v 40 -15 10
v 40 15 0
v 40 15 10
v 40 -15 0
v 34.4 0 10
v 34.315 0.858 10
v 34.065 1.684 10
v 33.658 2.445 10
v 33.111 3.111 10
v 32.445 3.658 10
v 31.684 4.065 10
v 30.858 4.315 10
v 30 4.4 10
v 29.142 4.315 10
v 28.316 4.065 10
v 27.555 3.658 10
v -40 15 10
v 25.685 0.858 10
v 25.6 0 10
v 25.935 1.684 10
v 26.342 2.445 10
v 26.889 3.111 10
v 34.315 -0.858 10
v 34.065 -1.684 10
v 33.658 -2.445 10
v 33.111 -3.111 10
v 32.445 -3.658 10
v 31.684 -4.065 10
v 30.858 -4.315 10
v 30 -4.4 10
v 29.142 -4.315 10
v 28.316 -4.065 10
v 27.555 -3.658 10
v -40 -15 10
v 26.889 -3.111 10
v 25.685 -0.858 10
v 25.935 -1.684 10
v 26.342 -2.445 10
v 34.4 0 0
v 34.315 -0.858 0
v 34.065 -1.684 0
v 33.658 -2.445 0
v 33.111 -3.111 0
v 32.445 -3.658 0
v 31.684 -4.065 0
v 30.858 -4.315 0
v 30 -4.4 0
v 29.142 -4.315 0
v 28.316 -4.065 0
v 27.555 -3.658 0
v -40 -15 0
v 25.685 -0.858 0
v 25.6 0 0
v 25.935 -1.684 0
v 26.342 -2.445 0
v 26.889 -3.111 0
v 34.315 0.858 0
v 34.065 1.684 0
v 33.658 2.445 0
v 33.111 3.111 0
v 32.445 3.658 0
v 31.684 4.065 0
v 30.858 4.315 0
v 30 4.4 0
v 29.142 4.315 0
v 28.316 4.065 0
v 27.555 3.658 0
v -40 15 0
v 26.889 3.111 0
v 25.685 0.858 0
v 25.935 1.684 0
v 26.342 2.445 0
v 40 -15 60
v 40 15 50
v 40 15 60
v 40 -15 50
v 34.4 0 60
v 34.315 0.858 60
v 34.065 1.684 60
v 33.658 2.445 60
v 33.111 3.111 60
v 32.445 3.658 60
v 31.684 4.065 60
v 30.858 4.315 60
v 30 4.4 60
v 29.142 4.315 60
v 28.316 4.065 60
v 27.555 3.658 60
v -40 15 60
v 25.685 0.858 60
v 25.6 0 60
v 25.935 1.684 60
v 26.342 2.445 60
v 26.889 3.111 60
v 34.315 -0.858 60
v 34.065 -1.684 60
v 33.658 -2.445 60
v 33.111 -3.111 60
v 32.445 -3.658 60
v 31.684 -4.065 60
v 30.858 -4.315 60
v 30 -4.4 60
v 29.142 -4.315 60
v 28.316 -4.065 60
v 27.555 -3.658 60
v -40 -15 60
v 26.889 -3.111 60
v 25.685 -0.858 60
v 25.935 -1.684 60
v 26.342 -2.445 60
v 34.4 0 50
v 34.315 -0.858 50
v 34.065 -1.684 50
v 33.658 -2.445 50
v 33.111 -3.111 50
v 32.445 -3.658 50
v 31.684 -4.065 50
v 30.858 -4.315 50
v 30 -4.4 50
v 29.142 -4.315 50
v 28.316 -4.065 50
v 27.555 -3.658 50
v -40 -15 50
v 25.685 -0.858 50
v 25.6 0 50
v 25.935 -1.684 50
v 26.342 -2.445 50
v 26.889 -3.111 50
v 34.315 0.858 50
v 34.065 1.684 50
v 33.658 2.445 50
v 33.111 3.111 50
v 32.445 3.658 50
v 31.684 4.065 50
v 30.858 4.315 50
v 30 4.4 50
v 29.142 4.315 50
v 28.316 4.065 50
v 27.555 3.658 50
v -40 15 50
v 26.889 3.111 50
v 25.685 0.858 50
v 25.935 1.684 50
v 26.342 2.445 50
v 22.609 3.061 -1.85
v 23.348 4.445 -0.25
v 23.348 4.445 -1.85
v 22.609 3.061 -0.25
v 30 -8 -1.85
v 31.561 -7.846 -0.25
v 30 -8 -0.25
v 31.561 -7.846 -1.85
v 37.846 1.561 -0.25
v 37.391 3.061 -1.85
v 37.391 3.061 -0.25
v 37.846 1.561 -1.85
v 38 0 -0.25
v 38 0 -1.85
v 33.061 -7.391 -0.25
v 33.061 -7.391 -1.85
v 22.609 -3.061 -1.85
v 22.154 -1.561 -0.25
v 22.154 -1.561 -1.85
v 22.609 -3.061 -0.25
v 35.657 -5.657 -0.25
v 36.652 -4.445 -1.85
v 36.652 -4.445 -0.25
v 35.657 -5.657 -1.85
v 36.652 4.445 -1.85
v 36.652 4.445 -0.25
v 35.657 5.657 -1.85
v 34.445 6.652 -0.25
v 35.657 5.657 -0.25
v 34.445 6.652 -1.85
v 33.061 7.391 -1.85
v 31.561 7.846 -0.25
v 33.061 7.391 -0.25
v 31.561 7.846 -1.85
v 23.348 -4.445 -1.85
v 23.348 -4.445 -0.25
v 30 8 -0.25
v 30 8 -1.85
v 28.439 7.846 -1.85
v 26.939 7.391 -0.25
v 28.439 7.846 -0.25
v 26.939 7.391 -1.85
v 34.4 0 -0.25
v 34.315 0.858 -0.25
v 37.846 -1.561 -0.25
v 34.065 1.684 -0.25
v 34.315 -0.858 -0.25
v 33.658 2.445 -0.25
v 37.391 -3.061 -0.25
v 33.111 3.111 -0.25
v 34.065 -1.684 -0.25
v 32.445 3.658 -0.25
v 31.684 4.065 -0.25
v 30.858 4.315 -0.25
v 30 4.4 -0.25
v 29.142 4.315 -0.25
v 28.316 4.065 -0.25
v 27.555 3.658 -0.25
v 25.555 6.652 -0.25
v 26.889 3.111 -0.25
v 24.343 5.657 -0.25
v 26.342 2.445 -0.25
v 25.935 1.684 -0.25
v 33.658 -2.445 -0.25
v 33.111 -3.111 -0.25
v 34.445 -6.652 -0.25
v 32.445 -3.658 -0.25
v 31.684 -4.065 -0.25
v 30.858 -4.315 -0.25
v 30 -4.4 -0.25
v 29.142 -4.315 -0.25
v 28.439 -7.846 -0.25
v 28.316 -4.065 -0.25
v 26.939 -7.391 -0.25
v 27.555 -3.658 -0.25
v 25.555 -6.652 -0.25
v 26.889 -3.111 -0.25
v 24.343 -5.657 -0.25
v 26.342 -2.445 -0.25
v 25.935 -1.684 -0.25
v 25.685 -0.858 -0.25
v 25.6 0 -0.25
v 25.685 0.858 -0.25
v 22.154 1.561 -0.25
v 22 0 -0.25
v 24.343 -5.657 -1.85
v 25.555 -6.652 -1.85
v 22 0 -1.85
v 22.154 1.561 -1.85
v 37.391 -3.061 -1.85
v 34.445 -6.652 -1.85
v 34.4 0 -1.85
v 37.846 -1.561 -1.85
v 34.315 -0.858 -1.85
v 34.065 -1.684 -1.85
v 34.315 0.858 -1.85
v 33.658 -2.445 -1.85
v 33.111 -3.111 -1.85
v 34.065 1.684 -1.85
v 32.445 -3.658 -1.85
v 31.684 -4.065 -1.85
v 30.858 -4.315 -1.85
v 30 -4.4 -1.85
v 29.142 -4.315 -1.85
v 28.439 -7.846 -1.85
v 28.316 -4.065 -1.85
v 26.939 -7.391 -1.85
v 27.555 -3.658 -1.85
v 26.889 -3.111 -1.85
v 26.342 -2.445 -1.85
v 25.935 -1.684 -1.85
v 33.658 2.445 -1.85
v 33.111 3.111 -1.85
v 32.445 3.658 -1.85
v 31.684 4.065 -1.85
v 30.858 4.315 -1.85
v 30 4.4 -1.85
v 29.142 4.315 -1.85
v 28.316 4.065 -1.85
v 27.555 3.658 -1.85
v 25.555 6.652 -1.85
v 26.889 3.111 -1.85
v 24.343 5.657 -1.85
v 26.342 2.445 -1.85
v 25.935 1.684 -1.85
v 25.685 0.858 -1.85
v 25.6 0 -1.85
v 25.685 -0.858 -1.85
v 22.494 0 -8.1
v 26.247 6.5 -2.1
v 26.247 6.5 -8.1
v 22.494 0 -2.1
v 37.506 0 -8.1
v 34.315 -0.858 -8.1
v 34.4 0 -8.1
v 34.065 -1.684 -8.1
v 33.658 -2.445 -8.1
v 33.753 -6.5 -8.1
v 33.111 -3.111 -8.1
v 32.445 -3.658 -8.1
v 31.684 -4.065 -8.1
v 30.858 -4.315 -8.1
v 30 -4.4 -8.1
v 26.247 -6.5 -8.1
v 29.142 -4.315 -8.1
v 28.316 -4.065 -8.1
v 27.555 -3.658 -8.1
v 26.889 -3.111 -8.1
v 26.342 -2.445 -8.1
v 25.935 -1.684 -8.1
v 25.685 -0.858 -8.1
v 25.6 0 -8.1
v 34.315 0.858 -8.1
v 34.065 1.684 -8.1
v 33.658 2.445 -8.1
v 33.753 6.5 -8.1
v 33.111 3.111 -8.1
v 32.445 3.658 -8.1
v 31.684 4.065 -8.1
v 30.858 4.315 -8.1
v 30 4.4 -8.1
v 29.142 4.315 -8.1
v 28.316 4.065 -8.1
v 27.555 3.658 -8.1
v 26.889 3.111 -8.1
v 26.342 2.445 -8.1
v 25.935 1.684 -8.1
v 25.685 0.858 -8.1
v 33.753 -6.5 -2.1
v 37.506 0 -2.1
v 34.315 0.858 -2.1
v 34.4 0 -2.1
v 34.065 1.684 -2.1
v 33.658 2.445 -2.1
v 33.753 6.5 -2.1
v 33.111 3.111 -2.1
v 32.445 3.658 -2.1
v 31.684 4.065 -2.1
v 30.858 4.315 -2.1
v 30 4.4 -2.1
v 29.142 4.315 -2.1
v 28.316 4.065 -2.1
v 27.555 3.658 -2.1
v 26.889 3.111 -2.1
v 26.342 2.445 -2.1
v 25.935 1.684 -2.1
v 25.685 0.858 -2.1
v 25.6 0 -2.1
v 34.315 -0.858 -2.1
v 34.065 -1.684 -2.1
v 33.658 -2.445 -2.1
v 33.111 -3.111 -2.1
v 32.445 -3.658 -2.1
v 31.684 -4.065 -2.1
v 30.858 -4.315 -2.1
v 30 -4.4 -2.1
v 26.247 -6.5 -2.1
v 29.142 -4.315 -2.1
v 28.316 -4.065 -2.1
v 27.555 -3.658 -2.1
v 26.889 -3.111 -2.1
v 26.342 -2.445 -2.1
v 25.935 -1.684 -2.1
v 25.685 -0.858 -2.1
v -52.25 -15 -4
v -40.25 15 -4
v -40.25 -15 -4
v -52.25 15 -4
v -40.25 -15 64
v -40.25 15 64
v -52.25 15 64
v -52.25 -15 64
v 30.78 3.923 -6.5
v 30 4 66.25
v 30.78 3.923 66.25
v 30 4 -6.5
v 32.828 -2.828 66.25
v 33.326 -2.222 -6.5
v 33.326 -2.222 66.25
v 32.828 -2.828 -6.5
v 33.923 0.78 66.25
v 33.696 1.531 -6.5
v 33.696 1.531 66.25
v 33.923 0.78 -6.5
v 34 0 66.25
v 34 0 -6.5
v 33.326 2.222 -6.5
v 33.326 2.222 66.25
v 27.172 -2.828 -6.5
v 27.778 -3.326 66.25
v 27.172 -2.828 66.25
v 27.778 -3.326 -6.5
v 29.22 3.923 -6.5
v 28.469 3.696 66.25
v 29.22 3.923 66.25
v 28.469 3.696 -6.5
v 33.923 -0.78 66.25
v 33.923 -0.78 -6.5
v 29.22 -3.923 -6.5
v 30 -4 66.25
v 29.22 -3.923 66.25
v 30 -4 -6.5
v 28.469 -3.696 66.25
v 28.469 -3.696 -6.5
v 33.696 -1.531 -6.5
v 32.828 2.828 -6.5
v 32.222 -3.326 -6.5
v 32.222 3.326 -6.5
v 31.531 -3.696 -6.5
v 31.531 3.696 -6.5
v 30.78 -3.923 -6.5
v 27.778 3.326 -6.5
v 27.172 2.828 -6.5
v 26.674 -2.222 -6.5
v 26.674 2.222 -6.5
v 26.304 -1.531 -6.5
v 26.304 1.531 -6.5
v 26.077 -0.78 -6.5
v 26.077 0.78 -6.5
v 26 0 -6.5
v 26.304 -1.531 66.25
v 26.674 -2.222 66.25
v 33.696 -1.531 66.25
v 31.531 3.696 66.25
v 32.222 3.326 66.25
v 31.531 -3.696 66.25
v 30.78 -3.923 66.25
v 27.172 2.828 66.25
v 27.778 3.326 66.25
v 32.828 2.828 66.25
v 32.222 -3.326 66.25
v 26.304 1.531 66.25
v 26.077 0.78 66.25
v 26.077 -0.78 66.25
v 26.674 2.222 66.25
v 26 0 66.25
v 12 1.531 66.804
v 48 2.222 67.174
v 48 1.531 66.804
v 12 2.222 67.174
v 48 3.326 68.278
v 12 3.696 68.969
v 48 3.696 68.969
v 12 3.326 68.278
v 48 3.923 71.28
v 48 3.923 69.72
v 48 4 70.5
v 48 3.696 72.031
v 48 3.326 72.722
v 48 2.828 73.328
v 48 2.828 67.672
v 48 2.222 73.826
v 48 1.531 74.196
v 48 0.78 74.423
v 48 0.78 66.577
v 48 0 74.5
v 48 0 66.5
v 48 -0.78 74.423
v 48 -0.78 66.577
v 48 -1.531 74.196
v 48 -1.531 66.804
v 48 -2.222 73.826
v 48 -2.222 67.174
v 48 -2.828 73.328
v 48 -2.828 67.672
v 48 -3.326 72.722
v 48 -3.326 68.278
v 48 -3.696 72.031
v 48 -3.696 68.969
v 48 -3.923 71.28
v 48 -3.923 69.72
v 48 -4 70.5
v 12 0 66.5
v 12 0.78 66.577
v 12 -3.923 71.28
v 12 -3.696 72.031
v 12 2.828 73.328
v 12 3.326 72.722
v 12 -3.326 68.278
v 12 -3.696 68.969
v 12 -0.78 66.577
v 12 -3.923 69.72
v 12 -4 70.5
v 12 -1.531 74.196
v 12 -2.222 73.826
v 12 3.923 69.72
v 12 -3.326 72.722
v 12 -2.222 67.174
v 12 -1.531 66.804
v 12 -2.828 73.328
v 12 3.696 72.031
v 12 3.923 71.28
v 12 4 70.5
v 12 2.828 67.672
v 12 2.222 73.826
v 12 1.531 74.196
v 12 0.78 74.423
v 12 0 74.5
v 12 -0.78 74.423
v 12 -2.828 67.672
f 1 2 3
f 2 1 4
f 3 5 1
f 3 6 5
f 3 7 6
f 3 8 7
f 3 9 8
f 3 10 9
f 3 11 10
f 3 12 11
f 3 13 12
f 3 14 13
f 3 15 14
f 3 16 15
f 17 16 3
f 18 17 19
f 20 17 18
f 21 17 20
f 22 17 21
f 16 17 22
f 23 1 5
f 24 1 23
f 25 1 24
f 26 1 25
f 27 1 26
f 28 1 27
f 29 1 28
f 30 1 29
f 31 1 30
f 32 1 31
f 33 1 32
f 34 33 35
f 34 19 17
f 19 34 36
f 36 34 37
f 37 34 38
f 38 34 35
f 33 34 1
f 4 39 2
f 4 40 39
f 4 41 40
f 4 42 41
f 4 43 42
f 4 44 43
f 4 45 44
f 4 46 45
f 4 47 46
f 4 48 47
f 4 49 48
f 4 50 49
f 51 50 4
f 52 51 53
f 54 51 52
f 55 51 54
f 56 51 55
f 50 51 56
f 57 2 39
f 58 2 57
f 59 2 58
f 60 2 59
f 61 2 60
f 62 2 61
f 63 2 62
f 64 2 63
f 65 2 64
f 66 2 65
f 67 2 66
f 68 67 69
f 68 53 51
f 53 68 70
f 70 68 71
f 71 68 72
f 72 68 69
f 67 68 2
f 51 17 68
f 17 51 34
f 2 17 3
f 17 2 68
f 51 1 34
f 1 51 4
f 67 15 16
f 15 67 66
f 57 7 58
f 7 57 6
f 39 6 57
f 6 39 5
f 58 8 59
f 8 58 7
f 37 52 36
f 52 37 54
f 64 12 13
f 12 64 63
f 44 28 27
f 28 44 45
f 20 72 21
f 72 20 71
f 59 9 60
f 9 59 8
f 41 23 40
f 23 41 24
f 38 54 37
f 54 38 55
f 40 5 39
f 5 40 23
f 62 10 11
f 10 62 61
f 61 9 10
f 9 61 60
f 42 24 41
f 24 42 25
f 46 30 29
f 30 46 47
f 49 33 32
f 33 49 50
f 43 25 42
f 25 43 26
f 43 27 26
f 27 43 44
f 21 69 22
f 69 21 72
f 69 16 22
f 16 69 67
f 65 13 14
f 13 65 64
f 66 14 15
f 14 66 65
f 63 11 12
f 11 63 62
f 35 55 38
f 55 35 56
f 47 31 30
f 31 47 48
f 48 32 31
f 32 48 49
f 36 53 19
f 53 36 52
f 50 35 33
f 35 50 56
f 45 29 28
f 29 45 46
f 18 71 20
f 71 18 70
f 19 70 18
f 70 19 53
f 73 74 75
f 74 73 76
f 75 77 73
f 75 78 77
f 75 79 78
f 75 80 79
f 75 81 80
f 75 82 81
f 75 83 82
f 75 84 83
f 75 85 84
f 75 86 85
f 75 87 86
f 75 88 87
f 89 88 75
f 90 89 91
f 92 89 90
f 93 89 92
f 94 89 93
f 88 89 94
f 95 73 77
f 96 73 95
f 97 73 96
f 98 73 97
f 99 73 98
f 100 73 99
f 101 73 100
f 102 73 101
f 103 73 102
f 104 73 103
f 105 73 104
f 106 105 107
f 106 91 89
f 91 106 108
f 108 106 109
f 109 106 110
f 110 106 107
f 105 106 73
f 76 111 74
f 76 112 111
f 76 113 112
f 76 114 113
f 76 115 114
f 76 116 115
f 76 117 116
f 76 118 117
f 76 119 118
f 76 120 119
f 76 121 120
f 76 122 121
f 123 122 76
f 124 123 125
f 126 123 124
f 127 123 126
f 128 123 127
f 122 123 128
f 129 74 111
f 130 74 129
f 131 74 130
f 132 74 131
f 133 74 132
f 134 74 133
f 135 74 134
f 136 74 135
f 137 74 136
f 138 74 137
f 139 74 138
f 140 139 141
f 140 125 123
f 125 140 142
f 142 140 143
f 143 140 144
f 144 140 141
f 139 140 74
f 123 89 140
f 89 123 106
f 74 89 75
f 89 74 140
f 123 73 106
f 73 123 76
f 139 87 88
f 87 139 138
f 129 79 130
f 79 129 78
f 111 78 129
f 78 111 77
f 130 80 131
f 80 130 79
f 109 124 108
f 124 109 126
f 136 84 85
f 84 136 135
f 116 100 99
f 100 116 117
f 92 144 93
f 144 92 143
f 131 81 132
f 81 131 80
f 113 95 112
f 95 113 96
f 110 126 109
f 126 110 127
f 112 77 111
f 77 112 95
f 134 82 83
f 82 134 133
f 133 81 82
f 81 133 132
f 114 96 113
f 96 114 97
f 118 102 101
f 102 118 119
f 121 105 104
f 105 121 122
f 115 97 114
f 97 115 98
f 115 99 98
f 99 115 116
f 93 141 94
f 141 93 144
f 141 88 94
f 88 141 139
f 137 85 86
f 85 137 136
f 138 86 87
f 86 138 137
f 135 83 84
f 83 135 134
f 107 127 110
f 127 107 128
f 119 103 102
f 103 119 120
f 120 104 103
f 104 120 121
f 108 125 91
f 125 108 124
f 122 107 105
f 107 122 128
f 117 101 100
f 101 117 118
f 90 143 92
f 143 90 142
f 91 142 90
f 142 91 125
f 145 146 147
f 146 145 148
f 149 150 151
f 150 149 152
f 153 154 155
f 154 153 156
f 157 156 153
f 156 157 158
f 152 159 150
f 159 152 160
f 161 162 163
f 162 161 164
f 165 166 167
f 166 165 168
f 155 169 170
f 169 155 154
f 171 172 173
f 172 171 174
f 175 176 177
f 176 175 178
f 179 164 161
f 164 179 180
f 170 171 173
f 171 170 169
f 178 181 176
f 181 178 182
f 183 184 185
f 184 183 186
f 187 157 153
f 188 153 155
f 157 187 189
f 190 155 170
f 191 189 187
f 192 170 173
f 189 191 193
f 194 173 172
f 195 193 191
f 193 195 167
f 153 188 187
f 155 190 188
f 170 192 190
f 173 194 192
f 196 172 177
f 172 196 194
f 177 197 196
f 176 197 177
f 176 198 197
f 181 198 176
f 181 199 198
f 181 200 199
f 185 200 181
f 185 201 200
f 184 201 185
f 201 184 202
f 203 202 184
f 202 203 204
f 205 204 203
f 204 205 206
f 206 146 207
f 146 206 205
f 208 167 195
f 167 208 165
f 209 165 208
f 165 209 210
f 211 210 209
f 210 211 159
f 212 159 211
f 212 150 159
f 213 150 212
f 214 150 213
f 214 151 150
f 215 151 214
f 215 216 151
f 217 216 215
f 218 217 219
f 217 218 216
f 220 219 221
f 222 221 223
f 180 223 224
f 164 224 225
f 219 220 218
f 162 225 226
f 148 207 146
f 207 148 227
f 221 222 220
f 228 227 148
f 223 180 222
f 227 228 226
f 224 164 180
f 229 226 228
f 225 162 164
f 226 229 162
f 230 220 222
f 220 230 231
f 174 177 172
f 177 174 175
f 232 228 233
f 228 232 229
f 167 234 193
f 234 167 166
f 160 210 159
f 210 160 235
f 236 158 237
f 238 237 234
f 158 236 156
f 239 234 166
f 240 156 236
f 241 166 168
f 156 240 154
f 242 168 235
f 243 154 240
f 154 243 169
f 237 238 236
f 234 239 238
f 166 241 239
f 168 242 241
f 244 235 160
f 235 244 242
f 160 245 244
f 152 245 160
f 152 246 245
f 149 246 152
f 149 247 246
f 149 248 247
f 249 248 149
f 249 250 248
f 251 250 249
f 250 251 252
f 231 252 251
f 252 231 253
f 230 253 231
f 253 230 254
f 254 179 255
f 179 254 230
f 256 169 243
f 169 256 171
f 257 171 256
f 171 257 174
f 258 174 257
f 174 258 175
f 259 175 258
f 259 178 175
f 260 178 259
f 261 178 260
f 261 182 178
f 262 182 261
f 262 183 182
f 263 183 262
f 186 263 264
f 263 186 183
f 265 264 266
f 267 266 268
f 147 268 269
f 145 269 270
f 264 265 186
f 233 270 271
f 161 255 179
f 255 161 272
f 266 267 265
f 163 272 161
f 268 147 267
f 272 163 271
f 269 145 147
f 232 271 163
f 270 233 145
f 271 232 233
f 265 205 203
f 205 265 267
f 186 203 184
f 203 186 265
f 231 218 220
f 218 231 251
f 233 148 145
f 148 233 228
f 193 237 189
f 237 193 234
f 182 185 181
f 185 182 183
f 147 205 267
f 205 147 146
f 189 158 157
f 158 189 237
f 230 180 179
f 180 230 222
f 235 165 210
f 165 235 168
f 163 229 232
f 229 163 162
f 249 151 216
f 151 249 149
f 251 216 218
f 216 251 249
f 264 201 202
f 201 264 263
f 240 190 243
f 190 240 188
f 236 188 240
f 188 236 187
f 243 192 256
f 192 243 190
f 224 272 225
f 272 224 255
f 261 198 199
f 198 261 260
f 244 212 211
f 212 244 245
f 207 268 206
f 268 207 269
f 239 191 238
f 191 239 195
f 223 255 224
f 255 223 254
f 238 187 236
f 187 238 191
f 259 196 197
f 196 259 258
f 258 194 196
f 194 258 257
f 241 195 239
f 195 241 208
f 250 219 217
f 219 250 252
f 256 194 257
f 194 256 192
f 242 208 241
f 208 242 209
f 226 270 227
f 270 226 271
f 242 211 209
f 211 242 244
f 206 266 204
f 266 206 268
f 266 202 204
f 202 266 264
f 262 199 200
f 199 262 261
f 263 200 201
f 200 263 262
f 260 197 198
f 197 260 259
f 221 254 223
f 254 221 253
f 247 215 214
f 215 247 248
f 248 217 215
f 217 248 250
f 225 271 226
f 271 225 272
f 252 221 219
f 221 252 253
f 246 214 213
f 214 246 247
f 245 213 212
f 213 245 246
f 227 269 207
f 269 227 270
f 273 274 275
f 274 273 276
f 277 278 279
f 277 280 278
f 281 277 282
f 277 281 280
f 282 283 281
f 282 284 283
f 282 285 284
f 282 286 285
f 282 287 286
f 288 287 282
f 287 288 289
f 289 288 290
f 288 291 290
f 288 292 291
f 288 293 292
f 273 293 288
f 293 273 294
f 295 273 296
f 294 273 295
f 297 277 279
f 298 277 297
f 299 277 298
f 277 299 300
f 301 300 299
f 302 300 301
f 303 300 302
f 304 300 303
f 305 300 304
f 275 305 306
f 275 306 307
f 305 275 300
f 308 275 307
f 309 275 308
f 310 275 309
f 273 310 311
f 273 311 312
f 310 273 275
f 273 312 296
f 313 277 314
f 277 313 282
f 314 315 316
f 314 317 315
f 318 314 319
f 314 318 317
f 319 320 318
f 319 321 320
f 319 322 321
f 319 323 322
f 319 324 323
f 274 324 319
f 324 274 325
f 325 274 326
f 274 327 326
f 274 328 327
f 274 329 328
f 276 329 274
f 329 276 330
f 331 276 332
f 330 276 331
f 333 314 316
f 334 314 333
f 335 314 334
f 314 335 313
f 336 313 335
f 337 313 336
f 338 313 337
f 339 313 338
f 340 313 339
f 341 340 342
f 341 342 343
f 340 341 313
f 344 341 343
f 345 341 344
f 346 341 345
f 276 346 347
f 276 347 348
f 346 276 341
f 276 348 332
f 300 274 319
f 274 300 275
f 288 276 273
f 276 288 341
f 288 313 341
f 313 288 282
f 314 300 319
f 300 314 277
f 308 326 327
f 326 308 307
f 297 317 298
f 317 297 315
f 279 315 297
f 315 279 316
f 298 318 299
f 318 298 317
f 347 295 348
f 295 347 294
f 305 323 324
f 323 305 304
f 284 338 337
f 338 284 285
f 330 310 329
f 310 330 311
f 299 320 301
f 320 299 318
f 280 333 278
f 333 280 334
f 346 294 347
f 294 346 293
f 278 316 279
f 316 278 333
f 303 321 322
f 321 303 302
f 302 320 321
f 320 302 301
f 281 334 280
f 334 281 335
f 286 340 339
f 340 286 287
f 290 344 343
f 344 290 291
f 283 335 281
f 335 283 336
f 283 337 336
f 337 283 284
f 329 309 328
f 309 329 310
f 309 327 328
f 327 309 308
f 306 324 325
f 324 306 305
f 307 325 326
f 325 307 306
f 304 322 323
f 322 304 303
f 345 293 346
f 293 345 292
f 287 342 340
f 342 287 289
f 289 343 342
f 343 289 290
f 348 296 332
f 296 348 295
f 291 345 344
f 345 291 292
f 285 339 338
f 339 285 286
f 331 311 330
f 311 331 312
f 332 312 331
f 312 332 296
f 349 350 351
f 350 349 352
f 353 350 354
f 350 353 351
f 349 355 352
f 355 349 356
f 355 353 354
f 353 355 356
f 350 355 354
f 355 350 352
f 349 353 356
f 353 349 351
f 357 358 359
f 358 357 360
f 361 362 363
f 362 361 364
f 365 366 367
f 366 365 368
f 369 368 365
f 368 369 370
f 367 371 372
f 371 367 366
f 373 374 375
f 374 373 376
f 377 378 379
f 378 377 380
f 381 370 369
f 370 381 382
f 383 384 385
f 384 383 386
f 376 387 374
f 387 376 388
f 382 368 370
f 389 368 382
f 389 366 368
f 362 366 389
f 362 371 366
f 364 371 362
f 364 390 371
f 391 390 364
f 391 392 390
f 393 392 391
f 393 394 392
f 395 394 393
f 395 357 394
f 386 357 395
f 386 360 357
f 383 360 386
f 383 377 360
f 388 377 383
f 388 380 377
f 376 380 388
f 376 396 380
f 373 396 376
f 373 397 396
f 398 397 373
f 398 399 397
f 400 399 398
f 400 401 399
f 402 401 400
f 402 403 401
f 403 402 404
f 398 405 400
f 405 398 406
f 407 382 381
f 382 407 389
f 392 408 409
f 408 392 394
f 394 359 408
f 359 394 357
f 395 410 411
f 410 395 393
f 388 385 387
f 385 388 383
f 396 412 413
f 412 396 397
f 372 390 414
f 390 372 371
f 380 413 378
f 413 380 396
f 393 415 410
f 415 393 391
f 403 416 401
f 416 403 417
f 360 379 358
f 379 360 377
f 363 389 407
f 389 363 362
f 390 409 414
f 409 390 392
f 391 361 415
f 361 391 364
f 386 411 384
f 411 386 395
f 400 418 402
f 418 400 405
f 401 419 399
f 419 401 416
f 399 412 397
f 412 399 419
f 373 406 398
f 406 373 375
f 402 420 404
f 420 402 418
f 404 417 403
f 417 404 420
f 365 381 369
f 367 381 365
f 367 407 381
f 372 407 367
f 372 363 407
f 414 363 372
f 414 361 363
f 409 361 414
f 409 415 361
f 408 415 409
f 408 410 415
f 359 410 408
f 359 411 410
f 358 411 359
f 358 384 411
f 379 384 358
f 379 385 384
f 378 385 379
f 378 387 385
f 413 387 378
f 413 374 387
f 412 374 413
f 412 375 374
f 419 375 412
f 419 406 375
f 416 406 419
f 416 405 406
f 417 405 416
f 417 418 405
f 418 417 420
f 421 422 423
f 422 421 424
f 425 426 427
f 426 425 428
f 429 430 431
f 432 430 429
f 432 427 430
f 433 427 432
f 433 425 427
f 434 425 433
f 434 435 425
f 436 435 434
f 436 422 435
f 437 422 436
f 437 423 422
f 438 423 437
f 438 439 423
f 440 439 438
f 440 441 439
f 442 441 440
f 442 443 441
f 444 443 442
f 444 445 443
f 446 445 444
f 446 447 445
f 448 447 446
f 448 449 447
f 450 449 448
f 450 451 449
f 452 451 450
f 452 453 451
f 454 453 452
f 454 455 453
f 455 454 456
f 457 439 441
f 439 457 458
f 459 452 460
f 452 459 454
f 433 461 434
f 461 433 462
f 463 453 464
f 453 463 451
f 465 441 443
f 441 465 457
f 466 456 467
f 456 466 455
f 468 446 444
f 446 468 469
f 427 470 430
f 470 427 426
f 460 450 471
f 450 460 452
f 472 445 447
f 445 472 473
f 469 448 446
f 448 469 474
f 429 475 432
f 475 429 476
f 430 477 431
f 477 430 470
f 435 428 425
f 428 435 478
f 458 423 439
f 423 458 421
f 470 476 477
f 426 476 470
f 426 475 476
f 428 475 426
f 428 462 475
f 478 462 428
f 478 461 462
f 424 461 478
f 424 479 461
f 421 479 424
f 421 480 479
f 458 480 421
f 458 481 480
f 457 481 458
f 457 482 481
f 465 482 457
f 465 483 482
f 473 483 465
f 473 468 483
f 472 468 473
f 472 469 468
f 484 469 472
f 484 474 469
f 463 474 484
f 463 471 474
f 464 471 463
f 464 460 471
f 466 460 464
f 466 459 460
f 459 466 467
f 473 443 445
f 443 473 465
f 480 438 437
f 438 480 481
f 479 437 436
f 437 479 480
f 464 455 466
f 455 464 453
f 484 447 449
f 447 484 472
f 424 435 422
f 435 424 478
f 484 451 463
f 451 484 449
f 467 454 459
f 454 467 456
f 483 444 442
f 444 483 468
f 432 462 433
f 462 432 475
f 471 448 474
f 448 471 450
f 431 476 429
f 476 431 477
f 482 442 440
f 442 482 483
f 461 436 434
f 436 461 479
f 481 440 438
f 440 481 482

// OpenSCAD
$fn = 32;

// ------------------------------------------------------------------------
// C clamp: throat 50 mm, screw d8
// Every part is its own module, assembly() places every instance.
// ------------------------------------------------------------------------

// --- part 1 ---
module clamp_arm() {
  difference() {
    translate([-40, -15, 0]) cube([80, 30, 10]);
    translate([30, 0, -1]) cylinder(h = 12, d = 8.8);
  }
}

// --- part 2 ---
module clamp_spine() {
  difference() {
    translate([-34, -15, 0]) cube([68, 30, 12]);
  }
}

// --- part 3 ---
module clamp_screw() {
  translate([0, 0, -36.375]) cylinder(h = 72.75, d = 8);
}

// --- part 4 ---
module clamp_washer() {
  difference() {
      translate([0, 0, 0]) cylinder(h = 1.6, d = 16);
      translate([0, 0, -1]) cylinder(h = 3.6, d = 8.8);
    }
}

// --- part 5 ---
module clamp_nut() {
  difference() {
    linear_extrude(height = 6) polygon(points = [[7.506, 0], [3.753, 6.5], [-3.753, 6.5], [-7.506, 0], [-3.753, -6.5], [3.753, -6.5]]);
    translate([0, 0, -1]) cylinder(h = 8, d = 8.8);
  }
}

// --- part 6 ---
module tommy_bar() {
  translate([0, 0, -18]) cylinder(h = 36, d = 8);
}

// --- assembly ---
module assembly() {
  color([0.80, 0.24, 0.20]) translate([0, 0, 0]) rotate([0, 0, 0]) clamp_arm();
  color([0.20, 0.45, 0.75]) translate([0, 0, 50]) rotate([0, 0, 0]) clamp_arm();
  color([0.25, 0.62, 0.32]) translate([-52.25, 0, 30]) rotate([0, 90, 0]) clamp_spine();
  color([0.92, 0.70, 0.18]) translate([30, 0, 29.875]) rotate([0, 0, 0]) clamp_screw();
  color([0.58, 0.35, 0.70]) translate([30, 0, -1.85]) rotate([0, 0, 0]) clamp_washer();
  color([0.16, 0.66, 0.66]) translate([30, 0, -8.1]) rotate([0, 0, 0]) clamp_nut();
  color([0.85, 0.48, 0.18]) translate([30, 0, 70.5]) rotate([0, 90, 0]) tommy_bar();
}

assembly();
